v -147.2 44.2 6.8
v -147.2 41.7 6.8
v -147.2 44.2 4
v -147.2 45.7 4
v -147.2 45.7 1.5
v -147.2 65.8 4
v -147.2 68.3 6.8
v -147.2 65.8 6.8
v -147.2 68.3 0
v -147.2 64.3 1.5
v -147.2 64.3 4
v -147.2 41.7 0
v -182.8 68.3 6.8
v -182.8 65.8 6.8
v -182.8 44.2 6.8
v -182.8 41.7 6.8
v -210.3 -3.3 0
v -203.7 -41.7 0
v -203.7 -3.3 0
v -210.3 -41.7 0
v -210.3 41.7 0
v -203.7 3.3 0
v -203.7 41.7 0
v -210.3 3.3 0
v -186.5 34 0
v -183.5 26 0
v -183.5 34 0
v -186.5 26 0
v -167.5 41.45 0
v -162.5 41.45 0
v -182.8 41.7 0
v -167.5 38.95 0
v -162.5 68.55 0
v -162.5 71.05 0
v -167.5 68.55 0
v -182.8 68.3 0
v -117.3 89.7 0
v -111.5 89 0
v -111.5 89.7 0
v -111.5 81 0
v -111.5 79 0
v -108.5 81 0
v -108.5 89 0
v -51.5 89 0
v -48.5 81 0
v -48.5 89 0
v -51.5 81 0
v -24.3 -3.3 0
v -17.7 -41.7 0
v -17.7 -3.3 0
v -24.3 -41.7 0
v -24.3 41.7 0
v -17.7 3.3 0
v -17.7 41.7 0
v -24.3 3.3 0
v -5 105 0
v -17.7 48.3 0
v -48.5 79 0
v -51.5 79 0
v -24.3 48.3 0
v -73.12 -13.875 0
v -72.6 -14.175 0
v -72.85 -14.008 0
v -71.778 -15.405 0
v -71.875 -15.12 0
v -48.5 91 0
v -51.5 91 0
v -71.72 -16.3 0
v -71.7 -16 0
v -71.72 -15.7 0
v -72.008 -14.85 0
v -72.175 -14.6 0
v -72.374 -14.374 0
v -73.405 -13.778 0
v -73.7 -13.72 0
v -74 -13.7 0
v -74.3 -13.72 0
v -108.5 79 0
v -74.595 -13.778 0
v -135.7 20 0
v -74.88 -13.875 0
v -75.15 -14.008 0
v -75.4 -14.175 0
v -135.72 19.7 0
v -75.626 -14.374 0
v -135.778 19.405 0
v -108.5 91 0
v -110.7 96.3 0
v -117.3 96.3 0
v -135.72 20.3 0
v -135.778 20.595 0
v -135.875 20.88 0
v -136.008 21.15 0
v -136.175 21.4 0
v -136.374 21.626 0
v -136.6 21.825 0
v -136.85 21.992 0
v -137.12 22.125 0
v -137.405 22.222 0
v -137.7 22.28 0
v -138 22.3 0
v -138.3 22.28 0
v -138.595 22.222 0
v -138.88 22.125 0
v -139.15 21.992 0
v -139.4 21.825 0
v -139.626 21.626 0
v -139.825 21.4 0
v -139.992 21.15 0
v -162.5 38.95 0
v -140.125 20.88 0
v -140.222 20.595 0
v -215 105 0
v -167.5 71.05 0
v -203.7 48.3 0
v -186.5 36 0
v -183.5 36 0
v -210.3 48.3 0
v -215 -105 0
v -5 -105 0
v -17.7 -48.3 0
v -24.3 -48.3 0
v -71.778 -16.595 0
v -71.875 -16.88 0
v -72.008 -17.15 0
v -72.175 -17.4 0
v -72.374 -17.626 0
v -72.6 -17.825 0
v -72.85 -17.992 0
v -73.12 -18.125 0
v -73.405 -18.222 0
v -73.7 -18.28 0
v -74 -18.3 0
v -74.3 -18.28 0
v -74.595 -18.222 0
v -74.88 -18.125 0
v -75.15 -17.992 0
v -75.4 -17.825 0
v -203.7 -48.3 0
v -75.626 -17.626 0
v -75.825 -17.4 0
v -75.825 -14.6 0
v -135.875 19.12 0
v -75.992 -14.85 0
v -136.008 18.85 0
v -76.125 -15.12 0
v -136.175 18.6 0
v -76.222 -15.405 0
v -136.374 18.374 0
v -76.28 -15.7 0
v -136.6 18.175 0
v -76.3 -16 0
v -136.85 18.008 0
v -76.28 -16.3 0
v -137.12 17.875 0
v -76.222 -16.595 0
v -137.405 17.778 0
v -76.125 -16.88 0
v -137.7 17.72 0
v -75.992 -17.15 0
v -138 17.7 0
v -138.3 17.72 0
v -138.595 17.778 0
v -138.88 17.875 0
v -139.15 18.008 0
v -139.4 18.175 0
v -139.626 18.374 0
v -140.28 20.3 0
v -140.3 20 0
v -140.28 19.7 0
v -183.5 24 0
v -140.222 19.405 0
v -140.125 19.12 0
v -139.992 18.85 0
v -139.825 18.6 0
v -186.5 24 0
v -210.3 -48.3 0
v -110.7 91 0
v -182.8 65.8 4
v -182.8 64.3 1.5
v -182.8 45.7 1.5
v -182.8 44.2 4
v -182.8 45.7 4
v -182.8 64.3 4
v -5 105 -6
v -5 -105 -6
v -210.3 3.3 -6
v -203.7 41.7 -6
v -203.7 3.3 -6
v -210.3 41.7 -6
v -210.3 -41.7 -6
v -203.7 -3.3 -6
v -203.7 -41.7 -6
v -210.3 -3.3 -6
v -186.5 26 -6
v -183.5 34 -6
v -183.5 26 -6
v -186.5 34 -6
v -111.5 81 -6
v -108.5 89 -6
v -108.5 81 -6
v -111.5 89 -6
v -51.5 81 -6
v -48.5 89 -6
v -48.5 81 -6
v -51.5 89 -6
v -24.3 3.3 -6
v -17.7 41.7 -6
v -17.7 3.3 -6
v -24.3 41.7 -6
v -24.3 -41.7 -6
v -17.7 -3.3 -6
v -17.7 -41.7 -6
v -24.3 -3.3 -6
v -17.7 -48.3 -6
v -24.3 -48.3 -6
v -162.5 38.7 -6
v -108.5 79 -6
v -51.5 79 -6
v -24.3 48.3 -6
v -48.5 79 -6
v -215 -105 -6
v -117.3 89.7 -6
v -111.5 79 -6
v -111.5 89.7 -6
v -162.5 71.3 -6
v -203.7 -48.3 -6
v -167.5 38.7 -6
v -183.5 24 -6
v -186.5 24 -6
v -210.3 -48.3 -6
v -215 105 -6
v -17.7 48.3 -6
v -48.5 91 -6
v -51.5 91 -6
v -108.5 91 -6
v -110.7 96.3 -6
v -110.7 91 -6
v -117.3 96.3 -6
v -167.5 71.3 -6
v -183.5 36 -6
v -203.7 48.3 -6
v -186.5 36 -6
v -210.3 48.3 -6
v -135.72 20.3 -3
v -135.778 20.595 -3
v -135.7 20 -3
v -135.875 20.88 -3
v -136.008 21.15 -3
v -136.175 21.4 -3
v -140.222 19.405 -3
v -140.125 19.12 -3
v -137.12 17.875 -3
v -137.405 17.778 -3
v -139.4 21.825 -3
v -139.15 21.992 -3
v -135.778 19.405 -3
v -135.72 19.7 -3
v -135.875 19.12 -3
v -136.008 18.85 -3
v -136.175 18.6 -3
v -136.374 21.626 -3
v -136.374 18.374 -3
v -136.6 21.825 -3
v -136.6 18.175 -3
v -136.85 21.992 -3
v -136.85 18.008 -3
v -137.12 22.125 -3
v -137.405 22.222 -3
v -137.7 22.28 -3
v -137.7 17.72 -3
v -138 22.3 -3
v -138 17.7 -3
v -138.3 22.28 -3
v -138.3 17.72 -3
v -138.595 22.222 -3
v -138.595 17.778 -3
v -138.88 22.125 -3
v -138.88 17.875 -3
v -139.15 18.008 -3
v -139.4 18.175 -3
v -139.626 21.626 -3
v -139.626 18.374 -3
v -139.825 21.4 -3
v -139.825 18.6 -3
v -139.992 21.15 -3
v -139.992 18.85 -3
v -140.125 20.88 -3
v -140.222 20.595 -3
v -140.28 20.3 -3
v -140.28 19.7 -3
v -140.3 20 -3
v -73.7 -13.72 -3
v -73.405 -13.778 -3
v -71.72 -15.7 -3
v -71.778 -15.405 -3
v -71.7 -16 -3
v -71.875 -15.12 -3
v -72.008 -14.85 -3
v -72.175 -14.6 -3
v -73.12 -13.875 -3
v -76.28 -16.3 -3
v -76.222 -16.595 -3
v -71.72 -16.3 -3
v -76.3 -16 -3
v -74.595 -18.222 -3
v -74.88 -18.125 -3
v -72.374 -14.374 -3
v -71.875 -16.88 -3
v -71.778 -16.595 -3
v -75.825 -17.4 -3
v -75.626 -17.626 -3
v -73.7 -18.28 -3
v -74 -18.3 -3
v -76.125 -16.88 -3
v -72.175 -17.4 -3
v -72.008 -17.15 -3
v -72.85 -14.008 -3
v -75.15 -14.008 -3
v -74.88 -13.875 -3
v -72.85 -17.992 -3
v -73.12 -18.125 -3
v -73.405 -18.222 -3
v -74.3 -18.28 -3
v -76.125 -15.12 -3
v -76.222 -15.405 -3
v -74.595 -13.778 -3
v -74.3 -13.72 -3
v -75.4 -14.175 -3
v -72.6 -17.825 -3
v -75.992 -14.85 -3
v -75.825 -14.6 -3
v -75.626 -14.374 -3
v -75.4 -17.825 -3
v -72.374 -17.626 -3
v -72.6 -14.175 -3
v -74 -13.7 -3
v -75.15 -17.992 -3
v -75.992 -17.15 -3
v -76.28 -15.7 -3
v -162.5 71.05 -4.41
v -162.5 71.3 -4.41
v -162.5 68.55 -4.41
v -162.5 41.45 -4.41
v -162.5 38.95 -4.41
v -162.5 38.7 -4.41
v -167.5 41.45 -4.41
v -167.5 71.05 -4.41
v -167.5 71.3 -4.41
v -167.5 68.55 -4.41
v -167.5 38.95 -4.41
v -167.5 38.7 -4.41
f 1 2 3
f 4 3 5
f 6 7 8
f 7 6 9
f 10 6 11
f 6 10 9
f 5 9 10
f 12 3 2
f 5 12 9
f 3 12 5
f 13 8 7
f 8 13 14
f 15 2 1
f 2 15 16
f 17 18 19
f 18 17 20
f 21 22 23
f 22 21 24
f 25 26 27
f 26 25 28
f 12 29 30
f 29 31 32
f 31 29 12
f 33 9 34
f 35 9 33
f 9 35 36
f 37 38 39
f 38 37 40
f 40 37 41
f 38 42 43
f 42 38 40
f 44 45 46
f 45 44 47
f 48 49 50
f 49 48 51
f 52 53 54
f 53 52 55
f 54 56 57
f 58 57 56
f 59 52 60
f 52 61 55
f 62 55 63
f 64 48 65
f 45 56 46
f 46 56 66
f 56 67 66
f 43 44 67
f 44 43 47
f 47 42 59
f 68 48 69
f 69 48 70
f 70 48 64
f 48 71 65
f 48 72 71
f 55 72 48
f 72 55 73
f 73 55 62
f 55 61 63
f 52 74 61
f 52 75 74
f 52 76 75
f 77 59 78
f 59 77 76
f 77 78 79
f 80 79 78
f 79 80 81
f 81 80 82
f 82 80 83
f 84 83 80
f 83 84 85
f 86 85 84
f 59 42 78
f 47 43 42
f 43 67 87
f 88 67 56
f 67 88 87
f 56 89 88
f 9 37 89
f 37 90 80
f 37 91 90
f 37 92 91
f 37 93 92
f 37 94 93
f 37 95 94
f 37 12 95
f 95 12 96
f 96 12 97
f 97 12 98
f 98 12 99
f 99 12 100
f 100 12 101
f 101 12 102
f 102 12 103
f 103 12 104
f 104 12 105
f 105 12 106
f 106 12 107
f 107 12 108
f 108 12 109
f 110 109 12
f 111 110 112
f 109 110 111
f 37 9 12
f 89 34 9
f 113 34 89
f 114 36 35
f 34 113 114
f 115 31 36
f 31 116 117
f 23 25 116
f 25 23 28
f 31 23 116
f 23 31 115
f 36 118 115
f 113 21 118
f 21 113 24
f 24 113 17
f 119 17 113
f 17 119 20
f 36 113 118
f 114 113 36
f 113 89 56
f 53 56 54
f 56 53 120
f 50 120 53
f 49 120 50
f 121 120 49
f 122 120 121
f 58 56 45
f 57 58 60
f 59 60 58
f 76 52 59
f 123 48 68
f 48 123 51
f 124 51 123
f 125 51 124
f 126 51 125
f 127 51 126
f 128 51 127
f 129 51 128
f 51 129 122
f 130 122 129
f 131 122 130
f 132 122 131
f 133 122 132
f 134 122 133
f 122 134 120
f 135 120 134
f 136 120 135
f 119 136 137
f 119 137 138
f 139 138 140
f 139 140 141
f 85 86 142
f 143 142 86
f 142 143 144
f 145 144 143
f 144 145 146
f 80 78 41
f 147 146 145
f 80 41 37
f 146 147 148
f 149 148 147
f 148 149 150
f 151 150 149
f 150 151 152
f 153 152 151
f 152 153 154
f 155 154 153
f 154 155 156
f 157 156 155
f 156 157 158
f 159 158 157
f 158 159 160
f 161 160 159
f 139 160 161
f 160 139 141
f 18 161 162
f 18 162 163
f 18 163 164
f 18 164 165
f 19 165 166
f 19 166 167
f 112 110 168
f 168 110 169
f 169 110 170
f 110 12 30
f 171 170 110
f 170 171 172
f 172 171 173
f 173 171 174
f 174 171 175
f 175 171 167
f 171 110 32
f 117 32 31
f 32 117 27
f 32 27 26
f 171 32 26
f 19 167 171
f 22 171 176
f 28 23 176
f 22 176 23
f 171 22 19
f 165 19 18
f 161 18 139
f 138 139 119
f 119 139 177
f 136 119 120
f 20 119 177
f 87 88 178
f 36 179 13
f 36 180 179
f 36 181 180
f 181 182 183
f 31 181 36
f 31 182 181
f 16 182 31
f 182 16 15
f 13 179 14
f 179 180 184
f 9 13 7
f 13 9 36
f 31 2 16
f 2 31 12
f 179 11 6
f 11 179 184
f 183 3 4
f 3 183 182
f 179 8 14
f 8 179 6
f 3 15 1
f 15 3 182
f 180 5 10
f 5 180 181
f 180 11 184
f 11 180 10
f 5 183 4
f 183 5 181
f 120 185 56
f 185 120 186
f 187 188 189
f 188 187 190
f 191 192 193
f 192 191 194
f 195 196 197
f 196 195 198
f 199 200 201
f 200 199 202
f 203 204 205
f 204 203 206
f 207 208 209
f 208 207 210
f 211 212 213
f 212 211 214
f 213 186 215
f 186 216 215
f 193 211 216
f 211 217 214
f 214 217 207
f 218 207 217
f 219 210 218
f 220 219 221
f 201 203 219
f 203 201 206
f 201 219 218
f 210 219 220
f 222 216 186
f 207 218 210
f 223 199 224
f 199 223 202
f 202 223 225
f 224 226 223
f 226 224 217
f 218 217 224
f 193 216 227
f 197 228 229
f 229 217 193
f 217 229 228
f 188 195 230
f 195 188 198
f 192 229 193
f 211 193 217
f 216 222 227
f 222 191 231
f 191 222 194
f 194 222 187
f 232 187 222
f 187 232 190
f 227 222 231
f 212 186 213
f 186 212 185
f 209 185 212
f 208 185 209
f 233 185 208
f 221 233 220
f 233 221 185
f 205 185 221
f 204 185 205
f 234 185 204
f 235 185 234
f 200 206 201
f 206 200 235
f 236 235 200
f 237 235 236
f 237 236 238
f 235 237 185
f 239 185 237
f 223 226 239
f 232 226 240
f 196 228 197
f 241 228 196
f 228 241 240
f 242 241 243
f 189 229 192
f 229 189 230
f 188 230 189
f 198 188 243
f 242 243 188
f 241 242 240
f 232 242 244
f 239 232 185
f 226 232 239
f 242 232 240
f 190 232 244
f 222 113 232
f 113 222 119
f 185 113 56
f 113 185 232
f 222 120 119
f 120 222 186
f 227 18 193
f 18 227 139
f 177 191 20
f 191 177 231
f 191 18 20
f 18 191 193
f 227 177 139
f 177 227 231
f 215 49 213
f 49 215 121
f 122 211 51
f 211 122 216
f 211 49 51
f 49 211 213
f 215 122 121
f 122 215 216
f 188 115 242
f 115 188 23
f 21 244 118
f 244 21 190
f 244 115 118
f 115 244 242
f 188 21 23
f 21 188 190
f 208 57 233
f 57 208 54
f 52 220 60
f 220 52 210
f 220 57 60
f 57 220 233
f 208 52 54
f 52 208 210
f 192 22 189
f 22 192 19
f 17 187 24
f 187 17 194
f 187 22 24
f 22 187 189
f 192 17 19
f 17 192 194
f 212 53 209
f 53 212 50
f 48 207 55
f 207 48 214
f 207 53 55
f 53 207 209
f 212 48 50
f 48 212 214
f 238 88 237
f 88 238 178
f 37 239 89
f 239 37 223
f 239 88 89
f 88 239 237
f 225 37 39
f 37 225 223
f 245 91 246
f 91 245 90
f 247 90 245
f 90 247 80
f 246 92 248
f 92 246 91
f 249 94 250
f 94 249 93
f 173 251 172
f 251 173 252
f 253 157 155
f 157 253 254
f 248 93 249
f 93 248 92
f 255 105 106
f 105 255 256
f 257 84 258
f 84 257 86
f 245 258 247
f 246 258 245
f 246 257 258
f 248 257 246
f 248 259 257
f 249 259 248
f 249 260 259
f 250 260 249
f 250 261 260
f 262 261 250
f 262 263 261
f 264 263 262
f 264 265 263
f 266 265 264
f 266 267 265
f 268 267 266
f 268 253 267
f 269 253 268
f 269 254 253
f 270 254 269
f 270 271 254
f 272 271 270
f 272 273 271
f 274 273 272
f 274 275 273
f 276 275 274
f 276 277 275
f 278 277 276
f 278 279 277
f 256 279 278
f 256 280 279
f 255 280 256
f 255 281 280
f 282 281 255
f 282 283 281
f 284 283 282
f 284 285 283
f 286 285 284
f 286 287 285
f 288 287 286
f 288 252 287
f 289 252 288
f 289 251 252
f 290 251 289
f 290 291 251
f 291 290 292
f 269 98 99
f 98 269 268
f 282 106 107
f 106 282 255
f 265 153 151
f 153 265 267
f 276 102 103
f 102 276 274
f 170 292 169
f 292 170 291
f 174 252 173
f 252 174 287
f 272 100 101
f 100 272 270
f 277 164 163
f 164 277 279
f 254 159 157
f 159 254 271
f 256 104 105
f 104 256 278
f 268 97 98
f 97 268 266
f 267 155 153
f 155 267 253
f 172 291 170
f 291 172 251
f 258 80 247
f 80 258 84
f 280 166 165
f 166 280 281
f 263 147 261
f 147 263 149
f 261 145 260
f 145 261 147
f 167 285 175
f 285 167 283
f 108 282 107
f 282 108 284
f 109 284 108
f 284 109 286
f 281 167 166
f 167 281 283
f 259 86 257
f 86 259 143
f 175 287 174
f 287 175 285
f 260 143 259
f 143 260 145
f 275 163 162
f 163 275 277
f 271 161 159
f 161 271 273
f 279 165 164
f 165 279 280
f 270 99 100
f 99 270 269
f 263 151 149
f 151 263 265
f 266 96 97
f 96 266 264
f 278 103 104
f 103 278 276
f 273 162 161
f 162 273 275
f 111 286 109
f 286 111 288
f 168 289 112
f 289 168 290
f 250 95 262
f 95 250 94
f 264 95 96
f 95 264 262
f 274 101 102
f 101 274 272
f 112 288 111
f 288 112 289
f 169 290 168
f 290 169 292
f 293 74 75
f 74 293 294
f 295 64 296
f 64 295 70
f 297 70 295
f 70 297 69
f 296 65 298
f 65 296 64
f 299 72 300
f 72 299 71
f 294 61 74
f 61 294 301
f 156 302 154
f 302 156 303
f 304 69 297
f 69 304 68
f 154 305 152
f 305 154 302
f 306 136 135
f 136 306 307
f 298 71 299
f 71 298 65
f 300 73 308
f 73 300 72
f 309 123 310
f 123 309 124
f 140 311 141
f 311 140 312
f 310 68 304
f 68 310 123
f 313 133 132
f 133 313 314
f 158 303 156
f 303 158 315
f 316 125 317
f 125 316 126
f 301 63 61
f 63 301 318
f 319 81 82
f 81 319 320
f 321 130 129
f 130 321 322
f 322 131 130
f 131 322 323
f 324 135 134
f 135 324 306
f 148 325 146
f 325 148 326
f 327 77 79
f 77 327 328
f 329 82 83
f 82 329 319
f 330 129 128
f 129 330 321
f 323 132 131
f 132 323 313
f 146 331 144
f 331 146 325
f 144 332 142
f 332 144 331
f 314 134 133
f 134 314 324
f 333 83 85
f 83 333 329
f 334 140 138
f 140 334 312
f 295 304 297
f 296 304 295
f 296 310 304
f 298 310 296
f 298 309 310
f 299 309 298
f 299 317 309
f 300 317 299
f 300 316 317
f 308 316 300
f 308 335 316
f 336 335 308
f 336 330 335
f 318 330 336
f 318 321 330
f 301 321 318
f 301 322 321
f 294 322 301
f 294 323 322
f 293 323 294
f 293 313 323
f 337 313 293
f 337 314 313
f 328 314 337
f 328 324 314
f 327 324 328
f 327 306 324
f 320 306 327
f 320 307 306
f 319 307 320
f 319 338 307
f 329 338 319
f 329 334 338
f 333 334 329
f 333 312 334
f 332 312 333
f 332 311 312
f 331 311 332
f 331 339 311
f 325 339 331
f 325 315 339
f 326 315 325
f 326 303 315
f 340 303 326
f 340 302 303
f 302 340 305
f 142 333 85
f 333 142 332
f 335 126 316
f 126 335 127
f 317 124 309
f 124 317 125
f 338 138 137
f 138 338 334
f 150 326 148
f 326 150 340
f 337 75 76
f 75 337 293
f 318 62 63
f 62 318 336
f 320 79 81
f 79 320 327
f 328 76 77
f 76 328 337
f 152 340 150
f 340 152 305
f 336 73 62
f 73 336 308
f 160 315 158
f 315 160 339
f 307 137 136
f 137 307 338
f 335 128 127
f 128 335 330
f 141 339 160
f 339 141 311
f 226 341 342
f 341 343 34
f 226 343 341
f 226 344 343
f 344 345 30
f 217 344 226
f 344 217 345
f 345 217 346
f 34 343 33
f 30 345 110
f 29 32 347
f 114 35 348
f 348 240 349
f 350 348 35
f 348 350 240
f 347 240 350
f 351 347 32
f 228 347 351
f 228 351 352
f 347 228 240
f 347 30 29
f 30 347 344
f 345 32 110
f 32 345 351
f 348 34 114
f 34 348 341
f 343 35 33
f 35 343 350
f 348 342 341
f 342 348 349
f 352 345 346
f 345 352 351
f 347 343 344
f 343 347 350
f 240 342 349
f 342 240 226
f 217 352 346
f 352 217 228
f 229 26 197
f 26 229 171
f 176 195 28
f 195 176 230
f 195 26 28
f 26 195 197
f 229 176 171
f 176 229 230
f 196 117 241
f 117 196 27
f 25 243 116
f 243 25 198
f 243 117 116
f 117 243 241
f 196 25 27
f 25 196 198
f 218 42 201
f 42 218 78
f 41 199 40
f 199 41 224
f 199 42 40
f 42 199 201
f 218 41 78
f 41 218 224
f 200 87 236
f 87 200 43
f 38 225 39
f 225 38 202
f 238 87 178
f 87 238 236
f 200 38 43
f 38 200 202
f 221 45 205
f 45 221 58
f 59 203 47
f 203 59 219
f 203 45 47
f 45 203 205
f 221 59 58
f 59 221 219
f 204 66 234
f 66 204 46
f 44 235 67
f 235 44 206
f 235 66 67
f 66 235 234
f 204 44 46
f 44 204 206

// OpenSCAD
// file: electronics.scad
// =====================================================================
// 전자부품 받침
//   ctrl_plate  제어판 (알약 스테이션 뒤, 탁자 위): 만능기판 + ESP32 + DC 잭을 한 판에
//   board_tray  작은 보드 받침 (ULN2003 ×4, MCP23017 → 알약 바닥판 / HX711 → 가루 바닥판, 바닥판에 붙어 있음)
// 나사 없음: 제어판은 한 판으로 출력, 작은 보드 받침은 바닥판과 한 덩어리.
// =====================================================================
include <config.scad>
include <lib.scad>

part = "ctrl";   // "ctrl" | "uln" | "mcp" | "hx" | "all"

wall   = 2.5;
lift   = 4;      // 보드 아랫면 높이 (납땜 자국 여유)
ledge  = 1.5;    // 보드 가장자리를 받치는 턱 폭

// ---- 알약 바닥판 위 배치 (알약 컵 기준) ----
uln_rel = [[62, 62], [-62, 62], [-62, -62], [62, -62]];   // pill_phi 45,135,225,315 모듈 아래
mcp_rel = [0, 62];
hx_rel  = [-55, 55];                                      // 가루 컵 기준

// 작은 보드 받침: 바닥판과 한 덩어리로 출력. 가장자리 턱 위에 보드, 짧은 두 변은 열려 있음(커넥터·핀).
// 보드는 케이블 타이 하나로 묶음: 받침 양옆 바닥판 구멍 → 바닥판 아랫면 홈 → 보드 위.
module board_tray(w, d, t) {
    ow = w + 2*clear; od = d + 2*clear;
    difference() {
        translate([-ow/2, -od/2 - wall, 0]) cube([ow, od + 2*wall, lift + t + 1.2]);
        translate([-ow/2 - 1, -od/2, lift]) cube([ow + 2, od, t + 5]);                          // 보드 자리
        translate([-ow/2 - 1, -od/2 + ledge, 1.5]) cube([ow + 2, od - 2*ledge, lift]);            // 납땜 자국 자리
    }
}
// 바닥판에서 파낼 것 (z=0 = 바닥판 윗면)
module board_tray_cut(w, d) {
    od = d + 2*clear;
    for (s = [-1, 1]) translate([-2.5, s * (od/2 + wall + 1.5) - 1.25, -base_t - 1]) cube([5, 2.5, base_t + 2]);
    translate([-2.5, -(od/2 + wall + 3), -base_t - 0.01]) cube([5, od + 2*wall + 6, 1.6]);
}

// ---- 제어판 ----
plate_t = 3;
pb_at   = [-45, 0];       // 제어판 기준
esp_at  = [30, 0];        // ESP32 는 세로로 (USB 가 +Y = 뒤쪽 가장자리)
dcj_at  = [78, 20];       // DC 잭은 +X 가장자리로 꽂음
groove_z = plate_t + 5;   // 만능기판 아랫면 높이
groove_d = 2;
esp_h   = 30;             // ESP32 아랫면 높이: 핀(약 8) + 점퍼 암 커넥터(14) + 굽힘 여유

module pb_holder() {       // 긴 두 변 홈에 밀어 넣음 (-X 쪽으로 넣고 +X 끝에서 멈춤)
    ow = pb_w + 2*wall; od = pb_d + 2*clear;
    difference() {
        union() for (s = [-1, 1]) translate([-ow/2, s > 0 ? od/2 - groove_d : -od/2 - wall, 0])
            cube([ow, wall + groove_d, groove_z + pb_t + 2*clear + 1.5]);
        translate([-ow/2 - 1, -od/2, groove_z]) cube([ow - wall + 1, od, pb_t + 2*clear]);
        translate([-ow/2 - 1, -od/2 + groove_d, groove_z]) cube([ow + 2, od - 2*groove_d, 20]);
    }
    translate([ow/2 - wall, -od/2 - wall, 0]) cube([wall, od + 2*wall, groove_z]);   // 끝 멈춤 (보드 아래까지만)
}

module esp_cradle() {      // 짧은 두 끝만 받침, 긴 두 변은 열림 → 점퍼를 먼저 꽂고 올려놓음
    L = esp_d; W = esp_w;  // 세로로 놓음: X 폭 = esp_d, Y 길이 = esp_w
    for (s = [-1, 1]) difference() {
        translate([-L/2 - wall, s > 0 ? W/2 - 3 : -W/2 - wall, 0]) cube([L + 2*wall, 3 + wall, esp_h + esp_t + 2]);
        translate([-L/2 - clear, -W/2 - clear, esp_h]) cube([L + 2*clear, W + 2*clear, 10]);
        if (s > 0) translate([-6, W/2 - 5, esp_h - 2]) cube([12, 10, 10]);    // USB 자리
    }
}

module dcj_clamp() {
    difference() {
        union() {
            translate([-10, -(dcj_d/2 + 3), 0]) cube([20, dcj_d + 6, dcj_d/2 + 4]);
        }
        translate([-11, 0, dcj_d/2 + 4]) rotate([0, 90, 0]) cylinder(d = dcj_d + 2*clear, h = 22);
        translate([-2, -(dcj_d/2 + 4), 0.9]) cube([4, dcj_d + 8, 1.8]);   // 케이블 타이 홈
    }
}

module ctrl_plate() {
    difference() {
        translate([-ctrl_size[0]/2, -ctrl_size[1]/2, 0]) cube([ctrl_size[0], ctrl_size[1], plate_t]);
        // 케이블 타이 구멍: 제어판 앞 가장자리 (스테이션 쪽 전선 다발)
        for (x = [-70, -20, 30]) for (dx = [-5, 5]) translate([x + dx - 1.5, -ctrl_size[1]/2 + 5, -1]) cube([3, 2, plate_t + 2]);
    }
    translate([pb_at[0], pb_at[1], 0]) pb_holder();
    translate([esp_at[0], esp_at[1], plate_t - 0.01]) esp_cradle();
    translate([dcj_at[0], dcj_at[1], plate_t - 0.01]) dcj_clamp();
}

// ---- 바닥판에 붙는 받침 (frame.scad 가 씀) ----
module pill_boards(cut = false) {
    for (r = uln_rel) translate([cupL[0] + r[0], cupL[1] + r[1], 0])
        if (cut) board_tray_cut(uln_w, uln_d); else board_tray(uln_w, uln_d, uln_t);
    translate([cupL[0] + mcp_rel[0], cupL[1] + mcp_rel[1], 0])
        if (cut) board_tray_cut(mcp_w, mcp_d); else board_tray(mcp_w, mcp_d, mcp_t);
}
module powder_boards(cut = false) translate([cupP[0] + hx_rel[0], cupP[1] + hx_rel[1], 0])
    if (cut) board_tray_cut(hx_w, hx_d); else board_tray(hx_w, hx_d, hx_t);
module boards_placed() { pill_boards(); powder_boards(); }
module ctrl_placed() translate([ctrl_c[0], ctrl_c[1], -base_t]) ctrl_plate();

module electronics_all() {
    boards_placed();
    ctrl_placed();
}

if      (part == "ctrl") ctrl_plate();
else if (part == "uln")  board_tray(uln_w, uln_d, uln_t);
else if (part == "mcp")  board_tray(mcp_w, mcp_d, mcp_t);
else if (part == "hx")   board_tray(hx_w, hx_d, hx_t);
else if (part == "all")  electronics_all();
// file: scale.scad
// =====================================================================
// 저울: 로드셀 받침(고정 끝 + 과부하 멈춤대) + 컵 쟁반(움직이는 끝) + 간격 와셔
// 전역 좌표 (원점 = 바닥판 윗면 가운데). 로드셀은 X 방향으로 누움.
// 고정 끝(전선 나오는 쪽) = M5x15 두 개, 아래에서 위로.
// 움직이는 끝 = M4x12 두 개, 쟁반 위에서 아래로.
// =====================================================================
include <config.scad>
include <lib.scad>

part = "pedestal";   // "pedestal" | "tray" | "spacer" | "all"

lc_x0   = cupP[0] - lc_l/2;       // 고정 끝
lc_x1   = cupP[0] + lc_l/2;       // 움직이는 끝
ped_h   = 12;
lc_z0   = ped_h;                  // 로드셀 아랫면
sp_h    = 3;                      // 간격 와셔 두께 (쟁반이 로드셀 몸통에 닿지 않게)
tray_z0 = lc_z0 + lc_h + sp_h;    // 쟁반 아랫면
tray_t  = 7;
ring_h  = 4;
tray_d  = cup_d_at(4) + 2*clear + 2*3;
cup_z0  = tray_z0 + tray_t;       // 컵 바닥 높이
strip_h = 6;                      // 받침 아래 띠 + 날개
stop_gap = 1.0;                   // 멈춤대 ↔ 로드셀 아랫면 (1kg 에서 휘는 양보다 큼)
stop_x  = lc_x1 - 4;

// 바닥판 핀 2개 (대각선) — 받침은 나사 없이 핀에 얹음
function scale_base_holes() = [[lc_x0 + 12, 20], [stop_x, -16]];
function cup_top_z() = cup_z0 + cup_h;
function cup_z_powder() = cup_z0;
function scale_tray_top() = cup_z0;

// 볼트 물림 길이 (로드셀 나사산에 들어가는 길이)
m5_bite = 15 - (ped_h - lc_fix_head_h);
m4_bite = 12 - (tray_t - lc_load_head_h) - sp_h;
echo(str("M5 물림 ", m5_bite, "mm, M4 물림 ", m4_bite, "mm (로드셀 두께 ", lc_h, ")"));
assert(m5_bite >= 5 && m5_bite < lc_h, "M5 길이 확인");
assert(m4_bite >= 5 && m4_bite < lc_h, "M4 길이 확인");

module pedestal() {
    difference() {
        union() {
            translate([lc_x0 - 4, -lc_w/2 - 4, 0]) cube([lc_holes[1] + 8, lc_w + 8, ped_h]);
            translate([lc_x0 + 4, -26, 0]) cube([16, 52, strip_h]);              // 고정 날개
            translate([lc_x0 - 4, -8, 0]) cube([lc_l + 8, 16, strip_h]);         // 멈춤대까지 띠
            translate([stop_x - 8, -22, 0]) cube([16, 44, strip_h]);             // 멈춤대 쪽 날개
            translate([stop_x - 4, -lc_w/2, 0]) cube([8, lc_w, lc_z0 - stop_gap]); // 멈춤대
        }
        for (h = [lc_holes[0], lc_holes[1]]) translate([lc_x0 + h, 0, 0]) {
            translate([0, 0, -1]) cylinder(d = lc_fix_bolt_d, h = ped_h + 2);
            translate([0, 0, -0.01]) cylinder(d = lc_fix_head_d, h = lc_fix_head_h);   // 머리 (아래에서)
        }
        for (p = scale_base_holes()) translate([p[0], p[1], -1]) cylinder(d = pin_hole, h = strip_h + 2);
    }
}

module tray() {
    difference() {
        union() {
            translate([0, 0, tray_z0]) hull() {
                translate([cupP[0], cupP[1], 0]) cylinder(d = tray_d, h = tray_t);
                translate([lc_x1 - lc_holes[1] - 6, -8, 0]) cube([lc_holes[1] + 6, 16, tray_t]);
            }
            // 컵 받침 링: 링 꼭대기 높이에서의 컵 지름에 맞춤
            translate([cupP[0], cupP[1], cup_z0 - 0.01]) difference() {
                cylinder(d = cup_d_at(ring_h) + 2*clear + 4, h = ring_h);
                translate([0, 0, -1]) cylinder(d = cup_d_at(ring_h) + 2*clear, h = ring_h + 2);
            }
        }
        for (h = lc_holes) translate([lc_x1 - h, 0, tray_z0]) {
            translate([0, 0, -1]) cylinder(d = lc_load_bolt_d, h = tray_t + 2);
            translate([0, 0, tray_t - lc_load_head_h]) cylinder(d = lc_load_head_d, h = lc_load_head_h + 1);
        }
    }
}

module spacer() {
    difference() { cylinder(d = 10, h = sp_h); translate([0, 0, -1]) cylinder(d = lc_load_bolt_d, h = sp_h + 2); }
}

module spacers_placed() {
    for (h = lc_holes) translate([lc_x1 - h, 0, lc_z0 + lc_h]) spacer();
}

module loadcell_ghost() {
    translate([lc_x0, -lc_w/2, lc_z0]) cube([lc_l, lc_w, lc_h]);
}

module cup_ghost(xy, z0) {
    translate([xy[0], xy[1], z0]) cylinder(d1 = cup_bottom_d, d2 = cup_top_d, h = cup_h);
}

module scale_all() {
    color("DimGray") pedestal();
    color("LightGray") tray();
    color("Gray") spacers_placed();
    %loadcell_ghost();
    %cup_ghost(cupP, cup_z0);
}

if      (part == "pedestal") pedestal();
else if (part == "tray")     translate([0, 0, -tray_z0]) tray();
else if (part == "spacer")   spacer();
else if (part == "all")      scale_all();
// file: layout.scad
// 모듈 배치 (frame.scad · assembly.scad 가 같이 씀). include <config.scad> 뒤에 include.

pill_phi = [45, 135, 225, 315];                    // 알약 컵 중심에서 본 모듈 방향

function rot2(p, a) = [p[0]*cos(a) - p[1]*sin(a), p[0]*sin(a) + p[1]*cos(a)];
function add2(a, b) = [a[0] + b[0], a[1] + b[1]];

// 가루 모듈 i: 출구 끝이 컵 중심에서 powder_d 떨어짐, 로컬 +Y 가 바깥쪽
function powder_xy(p, i) = add2(cupP, rot2(add2(p, [0, powder_d]), powder_a[i] - 90));
module at_powder(i) translate([cupP[0], cupP[1], deck_top]) rotate(powder_a[i] - 90) translate([0, powder_d, 0]) children();

// 알약 모듈 i: 로컬 +Y(출구)가 알약 컵 중심을 향함
function pill_center(i) = add2(cupL, rot2([pill_s * sqrt(2), 0], pill_phi[i]));
function pill_xy(p, i) = add2(pill_center(i), rot2(p, pill_phi[i] + 90));
module at_pill(i) translate([pill_center(i)[0], pill_center(i)[1], deck_top]) rotate(pill_phi[i] + 90) children();

// 미끄럼관 i: 로컬 +Y 가 모듈 쪽
function slide_xy(p, i) = add2(cupL, rot2(p, pill_phi[i] - 90));
module at_slide(i) translate([cupL[0], cupL[1], 0]) rotate(pill_phi[i] - 90) children();
// file: lib.scad
// 공통 도형. include <config.scad> 뒤에 include 하세요.

module slot2d(L, W) {           // 긴 방향이 Y인 둥근 직사각형
    hull() {
        translate([0, -(L - W)/2]) circle(d = W);
        translate([0,  (L - W)/2]) circle(d = W);
    }
}

module sector2d(a0, a1, R) {
    polygon(concat([[0, 0]], [for (a = [a0 : 5 : a1]) [R*cos(a), R*sin(a)]], [[R*cos(a1), R*sin(a1)]]));
}

// JGA25-370 축: 한쪽만 깎인 D컷 (깎인 면이 +X)
module dshaft_jga2d(c) {
    r = jga_shaft_d/2;
    intersection() {
        circle(d = jga_shaft_d + 2*c);
        translate([-r - c, -r - c]) square([jga_shaft_flat + 2*c, jga_shaft_d + 2*c]);
    }
}

// 28BYJ-48 축: 양쪽이 깎인 D컷
module dshaft_byj2d(c) {
    intersection() {
        circle(d = byj_shaft_d + 2*c);
        square([byj_shaft_flat + 2*c, byj_shaft_d * 2], center = true);
    }
}

// 가로로 뚫는 구멍용 물방울 모양 (뾰족한 쪽이 +Y → 출력 시 위쪽)
module teardrop2d(d) {
    union() {
        circle(d = d);
        polygon([[-d/2*cos(45), d/2*sin(45)], [0, d/2/sin(45)], [d/2*cos(45), d/2*sin(45)]]);
    }
}

// 꼭대기를 잘라 낸 물방울 (얇은 벽을 뚫지 않게)
module teardrop_flat2d(d, cap) {
    intersection() {
        teardrop2d(d);
        translate([-d, -d]) square([2*d, d + d/2 + cap]);
    }
}

module m3_nut_pocket(h) {        // 세로 육각 주머니
    cylinder(d = m3_nut_af / cos(30), h = h, $fn = 6);
}

// 옆에서 너트를 밀어 넣는 홈: +X 방향으로 열림
module m3_nut_slot(len) {
    hull() {
        m3_nut_pocket(m3_nut_t);
        translate([len, 0, 0]) m3_nut_pocket(m3_nut_t);
    }
}

module slotted_hole(d, len, h) { // X 방향 긴 구멍
    hull() {
        translate([-len/2, 0, 0]) cylinder(d = d, h = h);
        translate([ len/2, 0, 0]) cylinder(d = d, h = h);
    }
}
// file: config.scad
// =====================================================================
// 루틴 디스펜서 v2 (8칸: 가루 4 + 알약 4) · 공통 치수
// ---------------------------------------------------------------------
// 모든 부품 파일이 이 파일을 include 합니다. 숫자는 여기서만 고치세요.
// ★ = 추정치. 부품이 도착하면 측정표대로 재서 바꿉니다.
// 좌표: X 왼→오, Y 앞→뒤, Z 아래→위 (mm). 원점은 두 스테이션 사이, 바닥판 윗면 높이.
// 왼쪽 = 가루 스테이션, 오른쪽 = 알약 스테이션
// =====================================================================

$fn = 48;

// ---- 프린터 공차 (공차 쿠폰으로 확정) --------------------------------
clear      = 0.3;    // 끼워 맞춤 한쪽 여유 (쿠폰 C줄 3번으로 확정)
byj_d_clear = 0.15;  // 28BYJ 축 ↔ 원판 D구멍 여유 (쿠폰 B줄 4번으로 확정)
jga_d_clear = 0.15;  // ★ JGA 축 ↔ 스크류 허브 D구멍 여유 (쿠폰 J줄, 모터 오면 확정)
m3_hole    = 3.4;    // ★ M3 나사가 헐겁게 지나가는 구멍
m3_nut_af  = 5.8;    // ★ M3 너트 맞변 거리 + 여유 (육각 주머니)
m3_nut_t   = 2.7;    // ★ M3 너트 두께 + 여유
m3_head_d  = 6.2;    // 렌치볼트 머리 지름 + 여유
auger_gap  = 0.5;    // 스크류 날개 ↔ 관 벽 한쪽 틈. 스크류 지름만 바뀜 (관 16 고정)
                     // 좁히면 덜 새지만 가루가 끼어 모터가 멈출 수 있음. 가루 시험 전엔 0.5 유지

// ---- 나사 대신 쓰는 것 ------------------------------------------------
// 핀: 출력한 작은 원기둥. 구멍에 떨어뜨려 넣고 부품을 얹으면 자리가 잡힘 (무게로 눌림)
pin_d   = 4;
pin_len = 6.5;
pin_hole = pin_d + 2*clear;
// 기둥 끝 네모 돌기: 바닥판·상판의 네모 구멍에 끼움
peg_w = 6;  peg_h = 4;
peg_hole = peg_w + 2*clear;

// ---- 가루 모터: JGA25-370 6V 77RPM (상품 치수도 기준) ------------------
jga_gear_d    = 25;    // 감속기 지름 (치수도)
jga_gear_len  = 23;    // 감속기 길이 — 77RPM 은 23 (치수도 표)
jga_motor_d   = 24.4;  // 모터 몸통 지름 (치수도)
jga_motor_len = 30.8;  // 모터 몸통 길이 (치수도)
jga_term_len  = 4;     // 뒤쪽 단자 (치수도)
jga_shaft_d   = 4;     // 축 지름 (치수도)
jga_shaft_flat= 3.5;   // 축 D컷 (치수도)
jga_shaft_len = 11.5;  // 감속기 앞면 → 축 끝 (치수도)
jga_boss_d    = 7;     // 앞면 돌기 (치수도)
jga_boss_h    = 2.5;   // (치수도)
jga_len       = jga_gear_len + jga_motor_len + jga_term_len;

// ---- 알약 모터: 28BYJ-48 --------------------------------------------
byj_body_d    = 28;    // ★
byj_body_h    = 19;    // ★
byj_ear_span  = 35;    // ★ 고정 구멍 간격
byj_ear_hole  = 4.2;   // ★
byj_shaft_off = 8;     // ★ 몸통 중심 → 축
byj_shaft_d   = 5;     // ★
byj_shaft_flat= 3;     // ★ 양쪽 D컷 폭
byj_shaft_len = 9;     // ★ 축 돌기 윗면에서 끝까지
byj_flat_len  = 6;     // ★ D컷이 있는 길이 (축 끝에서부터). 그 아래는 둥근 축
byj_ear_t     = 0.8;   // ★ 고정 귀 두께
byj_boss_d    = 9;     // ★
byj_boss_h    = 1.5;   // ★

// ---- 로드셀 1kg (VLT-LCS002, 상품 치수도 기준) ------------------------
lc_l      = 80;        // 치수도
lc_w      = 12.7;      // 치수도
lc_h      = 12.7;      // 치수도
lc_holes  = [5, 20];   // 양 끝에서 구멍까지 (치수도: 15 간격, 안쪽 40 간격)
// 전선이 나오는 끝 = M5 두 개 = 고정 끝(받침). 반대 끝 = M4 두 개 = 쟁반.
lc_fix_bolt_d  = 5.5;  lc_fix_head_d  = 9.2;  lc_fix_head_h  = 5.8;   // M5x15 (머리 자리 천장이 처져도 머리가 안 튀어나오게 0.8 여유)
lc_load_bolt_d = 4.5;  lc_load_head_d = 7.6;  lc_load_head_h = 4.2;   // M4x12

// ---- 컵 (다이소, 미정) ------------------------------------------------
cup_bottom_d = 55;     // ★ 바닥 지름
cup_top_d    = 75;     // ★ 입구 지름 (가루 출구 4개가 이 안에 떨어져야 함)
cup_h        = 75;     // ★ 높이
function cup_d_at(h) = cup_bottom_d + (cup_top_d - cup_bottom_d) * h / cup_h;

// ---- 알약 -------------------------------------------------------------
pill_l = 23.5;         // ★ 00호 캡슐 길이
pill_w = 8.5;          // ★ 폭(지름)
pill_t = 8.5;          // ★ 누웠을 때 두께

// ---- 전자부품 ----------------------------------------------------------
pb_w = 89;  pb_d = 52; pb_t = 1.6;       // 만능기판 (상품명 치수) · 두께 ★
esp_w = 54.4; esp_d = 27.9; esp_t = 1.6; // ★ ESP32-DevKitC V4
dcj_d = 11;  dcj_l = 30;                 // ★ DC 잭 몸통 지름·길이
uln_w = 35;  uln_d = 33; uln_t = 1.6;    // ULN2003 보드 (상품 설명 35×33) · 두께 ★
mcp_w = 55;  mcp_d = 32; mcp_t = 1.6;    // ★ MCP23017 보드
hx_w  = 35;  hx_d  = 21; hx_t  = 1.6;    // ★ HX711 보드
hall_w = 4.2; hall_l = 3.2; hall_t = 1.6; // ★ 49E 홀 센서 알맹이 (TO-92S). KY-035 보드에서 떼어 다리에 단선 납땜
mag_d = 8;   mag_t = 3;                  // 원판 원점 자석 (ND 8Ø×3t)

// ---- 뼈대 (스테이션마다 바닥판 + 상판 + 기둥) ------------------------
base_t   = 6;          // 바닥판 두께 (아랫면에 너트 주머니)
deck_t   = 5;          // 상판 두께
deck_z   = 120;        // 상판 아랫면 높이
deck_top = deck_z + deck_t;
rim_h    = 6;          // 상판 테두리 (아래로)
rim_w    = 3;
post_w   = 14;

cupP  = [-110, 0];     // 가루 스테이션 중심 = 가루 컵 중심
cupL  = [ 105, 0];     // 알약 스테이션 중심 = 알약 컵 중심
sizeP = [210, 210];    // 가루 스테이션 판 크기
sizeL = [205, 205];    // 알약 스테이션 판 크기
// 기둥: 모듈 발판·모터 아래를 피하고, 앞쪽(-Y)은 컵을 꺼내는 길이라 비움
postsP = [for (p = [[-93,-45],[93,-45],[-93,45],[93,45],[-93,0],[93,0],[0,93]]) [cupP[0]+p[0], cupP[1]+p[1]]];
postsL = [for (p = [[-92,-92],[92,-92],[-92,92],[92,92],[-92,0],[92,0],[0,92]]) [cupL[0]+p[0], cupL[1]+p[1]]];
ctrl_c    = [cupL[0], cupL[1] + sizeL[1]/2 + 50];   // 제어함 (알약 스테이션 뒤, 탁자 위)
ctrl_size = [190, 90];

// ---- 배치 --------------------------------------------------------------
powder_d   = 13;                 // 컵 중심 → 가루 모듈 출구 끝면
powder_a   = [45, 135, 225, 315];// 가루 모듈 방향 (X자)
pill_s     = 51;                // 알약 모듈 중심의 X·Y 거리 (2×2)

// ---- 출력 영역 (Ender-3 SE) ------------------------------------------
bed = [220, 220, 250];
// main file
// =====================================================================
// 뼈대: 스테이션마다 바닥판 · 상판, 공통 기둥
//   가루 스테이션(P): 210×210, 기둥 7개
//   알약 스테이션(L): 205×205, 기둥 7개 + 미끄럼관 4개가 상판에 붙어 있음
//   앞쪽(-Y)은 컵을 꺼내는 길이라 가루 쪽 기둥이 없음
// 전역 좌표 (원점 = 바닥판 윗면 높이)
// 나사 없음: 기둥은 양 끝 네모 돌기를 판 구멍에 끼우고, 상판은 기둥 위에 얹음.
//            모듈은 상판의 핀 구멍에 핀을 넣고 얹음.
// =====================================================================
include <config.scad>
include <lib.scad>
include <layout.scad>
use <powder.scad>
use <pill.scad>
use <scale.scad>
use <electronics.scad>

part = "baseP";   // "baseP" | "deckP" | "baseL" | "deckL" | "post" | "pins" | "pegtest"

motor_wire_r = 128;   // 가루 모터 전선 구멍 (컵 중심에서 대각선 거리, 모터 몸통 아래)
peg_off = -post_w/2 + peg_w/2;   // 돌기는 기둥 한쪽 면에 붙어 있음 (눕혀서 출력할 때 바닥에 닿게)

// 기둥: 조립 위치로 모델링 (z 0 ~ deck_z)
module post() {
    translate([-post_w/2, -post_w/2, 0]) cube([post_w, post_w, deck_z]);
    for (z = [-peg_h, deck_z]) translate([peg_off - peg_w/2, -peg_w/2, z - 0.01 * sign(z)]) cube([peg_w, peg_w, peg_h + 0.01]);
}
module peg_holes(posts, z0, t) for (p = posts) translate([p[0] + peg_off - peg_hole/2, p[1] - peg_hole/2, z0 - 1]) cube([peg_hole, peg_hole, t + 2]);

// 핀 구멍 (위에서 3mm 막힌 구멍)
module pin_holes(pts, ztop) for (p = pts) translate([p[0], p[1], ztop - 3]) cylinder(d = pin_hole, h = 4);

module plate(center, size, z0, t) translate([center[0] - size[0]/2, center[1] - size[1]/2, z0]) cube([size[0], size[1], t]);

// 케이블 타이 구멍 한 쌍 (a = 전선 방향)
module tie_pair(p, a, z0, t) translate([p[0], p[1], z0 - 1]) rotate(a)
    for (s = [-1, 1]) translate([-1.5, s * 5 - 1, 0]) cube([3, 2, t + 2]);

module baseP() difference() {
    union() { plate(cupP, sizeP, -base_t, base_t); powder_boards(); }
    peg_holes(postsP, -base_t, base_t);
    pin_holes(scale_base_holes(), 0);
    powder_boards(true);
    // 로드셀 전선 → HX711 → 뒤쪽 가장자리
    for (p = [[-75, 30], [0, 85], [60, 85]]) tie_pair(add2(cupP, p), 0, -base_t, base_t);
}

module baseL() difference() {
    union() {
        plate(cupL, sizeL, -base_t, base_t);
        pill_boards();
        translate([cupL[0], cupL[1], -0.01]) difference() {       // 알약 컵 받침 링
            cylinder(d = cup_d_at(4) + 2*clear + 4, h = 4);
            translate([0, 0, -1]) cylinder(d = cup_d_at(4) + 2*clear, h = 6);
        }
    }
    peg_holes(postsL, -base_t, base_t);
    pill_boards(true);
    // ULN → MCP 점퍼 다발, 뒤쪽 가장자리로
    for (p = [[-35, 40], [35, 40], [-40, 88], [40, 88]]) tie_pair(add2(cupL, p), 0, -base_t, base_t);
}

module deck_body(center, size, notch = 0) {
    plate(center, size, deck_z, deck_t);
    translate([0, 0, deck_z - rim_h]) difference() {
        plate(center, size, 0, rim_h + 0.01);
        plate(center, [size[0] - 2*rim_w, size[1] - 2*rim_w], -1, rim_h + 2);
        if (notch > 0)     // 앞 테두리 홈: 컵을 들어서 앞으로 뺄 때 지나가는 길
            translate([center[0] - notch/2, center[1] - size[1]/2 - 1, -1]) cube([notch, rim_w + 2, rim_h + 2]);
    }
}

module deckP() difference() {
    deck_body(cupP, sizeP, cup_top_d + 12);
    peg_holes(postsP, deck_z, deck_t);
    pin_holes([for (i = [0:3], p = powder_deck_holes()) powder_xy(p, i)], deck_top);
    // 가루 낙하 구멍 4개 (출구마다)
    r = powder_outlet_rect();
    translate([0, 0, deck_z - 1]) linear_extrude(deck_t + 2)
        for (i = [0:3]) translate(cupP) rotate(powder_a[i] - 90) translate([0, powder_d])
            translate([r[0] - 1.5, r[2] - 1.5]) square([r[1] - r[0] + 3, r[3] - r[2] + 3]);
    // 모터 전선 구멍 (모터 몸통 바로 아래)
    for (i = [0:3]) translate([0, 0, deck_z - 1])
        translate(add2(cupP, rot2([motor_wire_r, 0], powder_a[i]))) cylinder(d = 9, h = deck_t + 2);
}

module deckL() difference() {
    union() {
        deck_body(cupL, sizeL);
        for (i = [0:3]) at_slide(i) pill_slide_solid();       // 미끄럼관 (상판과 한 덩어리)
    }
    for (i = [0:3]) at_slide(i) pill_slide_hole();
    peg_holes(postsL, deck_z, deck_t);
    pin_holes([for (i = [0:3], p = pill_deck_holes()) pill_xy(p, i)], deck_top);
    translate([0, 0, deck_z - 1]) linear_extrude(deck_t + 2) for (i = [0:3]) {
        // 전선 구멍: 28BYJ-48 커넥터(약 12.5×6)가 꽂힌 채로 + 홀 센서 선 3가닥
        translate(pill_xy(pill_wire_xy(), i)) rotate(pill_phi[i] + 90) square([20, 12], center = true);
    }
}

// 핀: 한 판에 모아서 출력 (가루 4×(상판 2 + 관 2) + 알약 4×2 + 저울 2 = 26개, 여분 4)
module pins() for (i = [0:29]) translate([(i % 6) * 8, floor(i / 6) * 8, 0]) cylinder(d = pin_d, h = pin_len);

// 기둥 돌기 시험 조각: 큰 판을 뽑기 전에 기둥 돌기가 판 구멍에 맞는지 확인.
// 구멍은 바닥판·상판과 같은 peg_holes() 로 뚫음 (숫자를 따로 적지 않음)
frame_pegtest_w = 18;
module pegtest() difference() {
    translate([-frame_pegtest_w/2, -frame_pegtest_w/2, 0]) cube([frame_pegtest_w, frame_pegtest_w, base_t]);
    peg_holes([[-peg_off, 0]], 0, base_t);
}

if      (part == "baseP") baseP();
else if (part == "baseL") baseL();
else if (part == "deckP") translate([0, 0, deck_top]) rotate([180, 0, 0]) deckP();   // 뒤집어 출력
else if (part == "deckL") translate([0, 0, deck_top]) rotate([180, 0, 0]) deckL();
else if (part == "post")  translate([0, 0, post_w/2]) rotate([0, -90, 0]) post();      // 눕혀서 출력 (돌기가 바닥 쪽)
else if (part == "pins")  pins();
else if (part == "pegtest") pegtest();
